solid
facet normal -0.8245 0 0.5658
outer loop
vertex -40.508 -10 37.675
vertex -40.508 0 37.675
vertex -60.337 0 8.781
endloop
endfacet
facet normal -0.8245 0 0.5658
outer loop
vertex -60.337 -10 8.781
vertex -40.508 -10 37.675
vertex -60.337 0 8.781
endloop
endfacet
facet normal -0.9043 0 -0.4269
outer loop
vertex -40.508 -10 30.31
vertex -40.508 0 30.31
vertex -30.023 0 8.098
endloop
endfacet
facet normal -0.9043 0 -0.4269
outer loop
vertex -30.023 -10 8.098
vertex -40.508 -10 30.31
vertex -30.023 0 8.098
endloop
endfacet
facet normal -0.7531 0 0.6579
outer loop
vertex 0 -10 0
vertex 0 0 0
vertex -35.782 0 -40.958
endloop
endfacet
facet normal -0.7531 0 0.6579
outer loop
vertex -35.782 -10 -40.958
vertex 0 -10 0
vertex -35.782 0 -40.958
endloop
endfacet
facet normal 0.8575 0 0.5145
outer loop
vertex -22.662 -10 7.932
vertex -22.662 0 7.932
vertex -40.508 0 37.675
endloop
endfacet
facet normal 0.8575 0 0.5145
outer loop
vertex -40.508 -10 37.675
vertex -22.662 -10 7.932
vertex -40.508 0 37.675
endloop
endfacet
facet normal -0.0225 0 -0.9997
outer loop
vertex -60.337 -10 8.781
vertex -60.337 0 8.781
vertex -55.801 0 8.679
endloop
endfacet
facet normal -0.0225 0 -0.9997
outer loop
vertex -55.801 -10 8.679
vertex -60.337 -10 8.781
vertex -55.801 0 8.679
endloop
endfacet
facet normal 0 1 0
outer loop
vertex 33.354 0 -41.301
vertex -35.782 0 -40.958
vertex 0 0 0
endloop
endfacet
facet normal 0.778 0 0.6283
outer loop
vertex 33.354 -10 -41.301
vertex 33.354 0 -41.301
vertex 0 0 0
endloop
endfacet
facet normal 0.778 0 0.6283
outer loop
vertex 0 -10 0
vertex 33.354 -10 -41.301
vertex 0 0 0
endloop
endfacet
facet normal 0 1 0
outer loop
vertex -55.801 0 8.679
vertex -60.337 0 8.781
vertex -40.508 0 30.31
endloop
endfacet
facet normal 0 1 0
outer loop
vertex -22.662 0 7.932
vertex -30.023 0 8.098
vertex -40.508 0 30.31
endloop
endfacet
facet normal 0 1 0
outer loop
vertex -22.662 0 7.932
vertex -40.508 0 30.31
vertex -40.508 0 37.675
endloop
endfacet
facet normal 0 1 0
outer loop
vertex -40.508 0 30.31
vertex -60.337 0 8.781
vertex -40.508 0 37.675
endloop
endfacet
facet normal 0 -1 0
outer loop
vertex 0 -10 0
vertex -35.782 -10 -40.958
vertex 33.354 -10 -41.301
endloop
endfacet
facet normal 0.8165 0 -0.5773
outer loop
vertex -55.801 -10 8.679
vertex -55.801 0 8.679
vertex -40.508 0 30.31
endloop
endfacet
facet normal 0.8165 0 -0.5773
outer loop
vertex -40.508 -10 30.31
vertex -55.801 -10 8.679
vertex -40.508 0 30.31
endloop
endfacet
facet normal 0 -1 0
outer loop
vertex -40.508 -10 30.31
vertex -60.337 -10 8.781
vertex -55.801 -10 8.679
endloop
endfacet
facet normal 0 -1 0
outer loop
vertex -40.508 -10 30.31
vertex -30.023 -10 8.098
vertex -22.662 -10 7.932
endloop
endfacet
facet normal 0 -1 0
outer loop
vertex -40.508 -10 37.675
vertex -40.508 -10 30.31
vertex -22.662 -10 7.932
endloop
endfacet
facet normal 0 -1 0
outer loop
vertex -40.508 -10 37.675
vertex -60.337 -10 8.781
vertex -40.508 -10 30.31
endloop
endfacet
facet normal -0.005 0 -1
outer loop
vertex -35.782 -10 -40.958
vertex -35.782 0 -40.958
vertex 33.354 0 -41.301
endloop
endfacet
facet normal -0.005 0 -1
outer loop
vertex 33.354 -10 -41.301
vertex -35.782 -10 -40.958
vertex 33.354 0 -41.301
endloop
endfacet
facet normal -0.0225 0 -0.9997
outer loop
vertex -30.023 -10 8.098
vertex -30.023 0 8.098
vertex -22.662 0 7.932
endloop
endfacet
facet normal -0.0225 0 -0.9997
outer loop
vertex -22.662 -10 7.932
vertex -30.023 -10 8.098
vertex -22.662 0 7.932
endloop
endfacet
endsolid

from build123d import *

# Parameters (mm, degrees)
F2_DEPTH = 10
F4_DEPTH = 10


with BuildPart() as f2:
    # F1 (on Front) → F2 (new body)
    with BuildSketch(Plane.XZ):
        Polygon((0, 0), (-35.782363, -40.958282), (33.35429, -41.300539), align=None)
    extrude(amount=F2_DEPTH)


with BuildPart() as f4:
    # F3 (on Front) → F4 (new body)
    with BuildSketch(Plane.XZ):
        Polygon((-40.508095, 37.675362), (-60.337234, 8.781475), (-55.800775, 8.679149), (-40.508095, 30.310253), (-30.023234, 8.0977), (-22.661872, 7.931654), align=None)
    extrude(amount=F4_DEPTH)


solid = Compound([f2.part, f4.part])
